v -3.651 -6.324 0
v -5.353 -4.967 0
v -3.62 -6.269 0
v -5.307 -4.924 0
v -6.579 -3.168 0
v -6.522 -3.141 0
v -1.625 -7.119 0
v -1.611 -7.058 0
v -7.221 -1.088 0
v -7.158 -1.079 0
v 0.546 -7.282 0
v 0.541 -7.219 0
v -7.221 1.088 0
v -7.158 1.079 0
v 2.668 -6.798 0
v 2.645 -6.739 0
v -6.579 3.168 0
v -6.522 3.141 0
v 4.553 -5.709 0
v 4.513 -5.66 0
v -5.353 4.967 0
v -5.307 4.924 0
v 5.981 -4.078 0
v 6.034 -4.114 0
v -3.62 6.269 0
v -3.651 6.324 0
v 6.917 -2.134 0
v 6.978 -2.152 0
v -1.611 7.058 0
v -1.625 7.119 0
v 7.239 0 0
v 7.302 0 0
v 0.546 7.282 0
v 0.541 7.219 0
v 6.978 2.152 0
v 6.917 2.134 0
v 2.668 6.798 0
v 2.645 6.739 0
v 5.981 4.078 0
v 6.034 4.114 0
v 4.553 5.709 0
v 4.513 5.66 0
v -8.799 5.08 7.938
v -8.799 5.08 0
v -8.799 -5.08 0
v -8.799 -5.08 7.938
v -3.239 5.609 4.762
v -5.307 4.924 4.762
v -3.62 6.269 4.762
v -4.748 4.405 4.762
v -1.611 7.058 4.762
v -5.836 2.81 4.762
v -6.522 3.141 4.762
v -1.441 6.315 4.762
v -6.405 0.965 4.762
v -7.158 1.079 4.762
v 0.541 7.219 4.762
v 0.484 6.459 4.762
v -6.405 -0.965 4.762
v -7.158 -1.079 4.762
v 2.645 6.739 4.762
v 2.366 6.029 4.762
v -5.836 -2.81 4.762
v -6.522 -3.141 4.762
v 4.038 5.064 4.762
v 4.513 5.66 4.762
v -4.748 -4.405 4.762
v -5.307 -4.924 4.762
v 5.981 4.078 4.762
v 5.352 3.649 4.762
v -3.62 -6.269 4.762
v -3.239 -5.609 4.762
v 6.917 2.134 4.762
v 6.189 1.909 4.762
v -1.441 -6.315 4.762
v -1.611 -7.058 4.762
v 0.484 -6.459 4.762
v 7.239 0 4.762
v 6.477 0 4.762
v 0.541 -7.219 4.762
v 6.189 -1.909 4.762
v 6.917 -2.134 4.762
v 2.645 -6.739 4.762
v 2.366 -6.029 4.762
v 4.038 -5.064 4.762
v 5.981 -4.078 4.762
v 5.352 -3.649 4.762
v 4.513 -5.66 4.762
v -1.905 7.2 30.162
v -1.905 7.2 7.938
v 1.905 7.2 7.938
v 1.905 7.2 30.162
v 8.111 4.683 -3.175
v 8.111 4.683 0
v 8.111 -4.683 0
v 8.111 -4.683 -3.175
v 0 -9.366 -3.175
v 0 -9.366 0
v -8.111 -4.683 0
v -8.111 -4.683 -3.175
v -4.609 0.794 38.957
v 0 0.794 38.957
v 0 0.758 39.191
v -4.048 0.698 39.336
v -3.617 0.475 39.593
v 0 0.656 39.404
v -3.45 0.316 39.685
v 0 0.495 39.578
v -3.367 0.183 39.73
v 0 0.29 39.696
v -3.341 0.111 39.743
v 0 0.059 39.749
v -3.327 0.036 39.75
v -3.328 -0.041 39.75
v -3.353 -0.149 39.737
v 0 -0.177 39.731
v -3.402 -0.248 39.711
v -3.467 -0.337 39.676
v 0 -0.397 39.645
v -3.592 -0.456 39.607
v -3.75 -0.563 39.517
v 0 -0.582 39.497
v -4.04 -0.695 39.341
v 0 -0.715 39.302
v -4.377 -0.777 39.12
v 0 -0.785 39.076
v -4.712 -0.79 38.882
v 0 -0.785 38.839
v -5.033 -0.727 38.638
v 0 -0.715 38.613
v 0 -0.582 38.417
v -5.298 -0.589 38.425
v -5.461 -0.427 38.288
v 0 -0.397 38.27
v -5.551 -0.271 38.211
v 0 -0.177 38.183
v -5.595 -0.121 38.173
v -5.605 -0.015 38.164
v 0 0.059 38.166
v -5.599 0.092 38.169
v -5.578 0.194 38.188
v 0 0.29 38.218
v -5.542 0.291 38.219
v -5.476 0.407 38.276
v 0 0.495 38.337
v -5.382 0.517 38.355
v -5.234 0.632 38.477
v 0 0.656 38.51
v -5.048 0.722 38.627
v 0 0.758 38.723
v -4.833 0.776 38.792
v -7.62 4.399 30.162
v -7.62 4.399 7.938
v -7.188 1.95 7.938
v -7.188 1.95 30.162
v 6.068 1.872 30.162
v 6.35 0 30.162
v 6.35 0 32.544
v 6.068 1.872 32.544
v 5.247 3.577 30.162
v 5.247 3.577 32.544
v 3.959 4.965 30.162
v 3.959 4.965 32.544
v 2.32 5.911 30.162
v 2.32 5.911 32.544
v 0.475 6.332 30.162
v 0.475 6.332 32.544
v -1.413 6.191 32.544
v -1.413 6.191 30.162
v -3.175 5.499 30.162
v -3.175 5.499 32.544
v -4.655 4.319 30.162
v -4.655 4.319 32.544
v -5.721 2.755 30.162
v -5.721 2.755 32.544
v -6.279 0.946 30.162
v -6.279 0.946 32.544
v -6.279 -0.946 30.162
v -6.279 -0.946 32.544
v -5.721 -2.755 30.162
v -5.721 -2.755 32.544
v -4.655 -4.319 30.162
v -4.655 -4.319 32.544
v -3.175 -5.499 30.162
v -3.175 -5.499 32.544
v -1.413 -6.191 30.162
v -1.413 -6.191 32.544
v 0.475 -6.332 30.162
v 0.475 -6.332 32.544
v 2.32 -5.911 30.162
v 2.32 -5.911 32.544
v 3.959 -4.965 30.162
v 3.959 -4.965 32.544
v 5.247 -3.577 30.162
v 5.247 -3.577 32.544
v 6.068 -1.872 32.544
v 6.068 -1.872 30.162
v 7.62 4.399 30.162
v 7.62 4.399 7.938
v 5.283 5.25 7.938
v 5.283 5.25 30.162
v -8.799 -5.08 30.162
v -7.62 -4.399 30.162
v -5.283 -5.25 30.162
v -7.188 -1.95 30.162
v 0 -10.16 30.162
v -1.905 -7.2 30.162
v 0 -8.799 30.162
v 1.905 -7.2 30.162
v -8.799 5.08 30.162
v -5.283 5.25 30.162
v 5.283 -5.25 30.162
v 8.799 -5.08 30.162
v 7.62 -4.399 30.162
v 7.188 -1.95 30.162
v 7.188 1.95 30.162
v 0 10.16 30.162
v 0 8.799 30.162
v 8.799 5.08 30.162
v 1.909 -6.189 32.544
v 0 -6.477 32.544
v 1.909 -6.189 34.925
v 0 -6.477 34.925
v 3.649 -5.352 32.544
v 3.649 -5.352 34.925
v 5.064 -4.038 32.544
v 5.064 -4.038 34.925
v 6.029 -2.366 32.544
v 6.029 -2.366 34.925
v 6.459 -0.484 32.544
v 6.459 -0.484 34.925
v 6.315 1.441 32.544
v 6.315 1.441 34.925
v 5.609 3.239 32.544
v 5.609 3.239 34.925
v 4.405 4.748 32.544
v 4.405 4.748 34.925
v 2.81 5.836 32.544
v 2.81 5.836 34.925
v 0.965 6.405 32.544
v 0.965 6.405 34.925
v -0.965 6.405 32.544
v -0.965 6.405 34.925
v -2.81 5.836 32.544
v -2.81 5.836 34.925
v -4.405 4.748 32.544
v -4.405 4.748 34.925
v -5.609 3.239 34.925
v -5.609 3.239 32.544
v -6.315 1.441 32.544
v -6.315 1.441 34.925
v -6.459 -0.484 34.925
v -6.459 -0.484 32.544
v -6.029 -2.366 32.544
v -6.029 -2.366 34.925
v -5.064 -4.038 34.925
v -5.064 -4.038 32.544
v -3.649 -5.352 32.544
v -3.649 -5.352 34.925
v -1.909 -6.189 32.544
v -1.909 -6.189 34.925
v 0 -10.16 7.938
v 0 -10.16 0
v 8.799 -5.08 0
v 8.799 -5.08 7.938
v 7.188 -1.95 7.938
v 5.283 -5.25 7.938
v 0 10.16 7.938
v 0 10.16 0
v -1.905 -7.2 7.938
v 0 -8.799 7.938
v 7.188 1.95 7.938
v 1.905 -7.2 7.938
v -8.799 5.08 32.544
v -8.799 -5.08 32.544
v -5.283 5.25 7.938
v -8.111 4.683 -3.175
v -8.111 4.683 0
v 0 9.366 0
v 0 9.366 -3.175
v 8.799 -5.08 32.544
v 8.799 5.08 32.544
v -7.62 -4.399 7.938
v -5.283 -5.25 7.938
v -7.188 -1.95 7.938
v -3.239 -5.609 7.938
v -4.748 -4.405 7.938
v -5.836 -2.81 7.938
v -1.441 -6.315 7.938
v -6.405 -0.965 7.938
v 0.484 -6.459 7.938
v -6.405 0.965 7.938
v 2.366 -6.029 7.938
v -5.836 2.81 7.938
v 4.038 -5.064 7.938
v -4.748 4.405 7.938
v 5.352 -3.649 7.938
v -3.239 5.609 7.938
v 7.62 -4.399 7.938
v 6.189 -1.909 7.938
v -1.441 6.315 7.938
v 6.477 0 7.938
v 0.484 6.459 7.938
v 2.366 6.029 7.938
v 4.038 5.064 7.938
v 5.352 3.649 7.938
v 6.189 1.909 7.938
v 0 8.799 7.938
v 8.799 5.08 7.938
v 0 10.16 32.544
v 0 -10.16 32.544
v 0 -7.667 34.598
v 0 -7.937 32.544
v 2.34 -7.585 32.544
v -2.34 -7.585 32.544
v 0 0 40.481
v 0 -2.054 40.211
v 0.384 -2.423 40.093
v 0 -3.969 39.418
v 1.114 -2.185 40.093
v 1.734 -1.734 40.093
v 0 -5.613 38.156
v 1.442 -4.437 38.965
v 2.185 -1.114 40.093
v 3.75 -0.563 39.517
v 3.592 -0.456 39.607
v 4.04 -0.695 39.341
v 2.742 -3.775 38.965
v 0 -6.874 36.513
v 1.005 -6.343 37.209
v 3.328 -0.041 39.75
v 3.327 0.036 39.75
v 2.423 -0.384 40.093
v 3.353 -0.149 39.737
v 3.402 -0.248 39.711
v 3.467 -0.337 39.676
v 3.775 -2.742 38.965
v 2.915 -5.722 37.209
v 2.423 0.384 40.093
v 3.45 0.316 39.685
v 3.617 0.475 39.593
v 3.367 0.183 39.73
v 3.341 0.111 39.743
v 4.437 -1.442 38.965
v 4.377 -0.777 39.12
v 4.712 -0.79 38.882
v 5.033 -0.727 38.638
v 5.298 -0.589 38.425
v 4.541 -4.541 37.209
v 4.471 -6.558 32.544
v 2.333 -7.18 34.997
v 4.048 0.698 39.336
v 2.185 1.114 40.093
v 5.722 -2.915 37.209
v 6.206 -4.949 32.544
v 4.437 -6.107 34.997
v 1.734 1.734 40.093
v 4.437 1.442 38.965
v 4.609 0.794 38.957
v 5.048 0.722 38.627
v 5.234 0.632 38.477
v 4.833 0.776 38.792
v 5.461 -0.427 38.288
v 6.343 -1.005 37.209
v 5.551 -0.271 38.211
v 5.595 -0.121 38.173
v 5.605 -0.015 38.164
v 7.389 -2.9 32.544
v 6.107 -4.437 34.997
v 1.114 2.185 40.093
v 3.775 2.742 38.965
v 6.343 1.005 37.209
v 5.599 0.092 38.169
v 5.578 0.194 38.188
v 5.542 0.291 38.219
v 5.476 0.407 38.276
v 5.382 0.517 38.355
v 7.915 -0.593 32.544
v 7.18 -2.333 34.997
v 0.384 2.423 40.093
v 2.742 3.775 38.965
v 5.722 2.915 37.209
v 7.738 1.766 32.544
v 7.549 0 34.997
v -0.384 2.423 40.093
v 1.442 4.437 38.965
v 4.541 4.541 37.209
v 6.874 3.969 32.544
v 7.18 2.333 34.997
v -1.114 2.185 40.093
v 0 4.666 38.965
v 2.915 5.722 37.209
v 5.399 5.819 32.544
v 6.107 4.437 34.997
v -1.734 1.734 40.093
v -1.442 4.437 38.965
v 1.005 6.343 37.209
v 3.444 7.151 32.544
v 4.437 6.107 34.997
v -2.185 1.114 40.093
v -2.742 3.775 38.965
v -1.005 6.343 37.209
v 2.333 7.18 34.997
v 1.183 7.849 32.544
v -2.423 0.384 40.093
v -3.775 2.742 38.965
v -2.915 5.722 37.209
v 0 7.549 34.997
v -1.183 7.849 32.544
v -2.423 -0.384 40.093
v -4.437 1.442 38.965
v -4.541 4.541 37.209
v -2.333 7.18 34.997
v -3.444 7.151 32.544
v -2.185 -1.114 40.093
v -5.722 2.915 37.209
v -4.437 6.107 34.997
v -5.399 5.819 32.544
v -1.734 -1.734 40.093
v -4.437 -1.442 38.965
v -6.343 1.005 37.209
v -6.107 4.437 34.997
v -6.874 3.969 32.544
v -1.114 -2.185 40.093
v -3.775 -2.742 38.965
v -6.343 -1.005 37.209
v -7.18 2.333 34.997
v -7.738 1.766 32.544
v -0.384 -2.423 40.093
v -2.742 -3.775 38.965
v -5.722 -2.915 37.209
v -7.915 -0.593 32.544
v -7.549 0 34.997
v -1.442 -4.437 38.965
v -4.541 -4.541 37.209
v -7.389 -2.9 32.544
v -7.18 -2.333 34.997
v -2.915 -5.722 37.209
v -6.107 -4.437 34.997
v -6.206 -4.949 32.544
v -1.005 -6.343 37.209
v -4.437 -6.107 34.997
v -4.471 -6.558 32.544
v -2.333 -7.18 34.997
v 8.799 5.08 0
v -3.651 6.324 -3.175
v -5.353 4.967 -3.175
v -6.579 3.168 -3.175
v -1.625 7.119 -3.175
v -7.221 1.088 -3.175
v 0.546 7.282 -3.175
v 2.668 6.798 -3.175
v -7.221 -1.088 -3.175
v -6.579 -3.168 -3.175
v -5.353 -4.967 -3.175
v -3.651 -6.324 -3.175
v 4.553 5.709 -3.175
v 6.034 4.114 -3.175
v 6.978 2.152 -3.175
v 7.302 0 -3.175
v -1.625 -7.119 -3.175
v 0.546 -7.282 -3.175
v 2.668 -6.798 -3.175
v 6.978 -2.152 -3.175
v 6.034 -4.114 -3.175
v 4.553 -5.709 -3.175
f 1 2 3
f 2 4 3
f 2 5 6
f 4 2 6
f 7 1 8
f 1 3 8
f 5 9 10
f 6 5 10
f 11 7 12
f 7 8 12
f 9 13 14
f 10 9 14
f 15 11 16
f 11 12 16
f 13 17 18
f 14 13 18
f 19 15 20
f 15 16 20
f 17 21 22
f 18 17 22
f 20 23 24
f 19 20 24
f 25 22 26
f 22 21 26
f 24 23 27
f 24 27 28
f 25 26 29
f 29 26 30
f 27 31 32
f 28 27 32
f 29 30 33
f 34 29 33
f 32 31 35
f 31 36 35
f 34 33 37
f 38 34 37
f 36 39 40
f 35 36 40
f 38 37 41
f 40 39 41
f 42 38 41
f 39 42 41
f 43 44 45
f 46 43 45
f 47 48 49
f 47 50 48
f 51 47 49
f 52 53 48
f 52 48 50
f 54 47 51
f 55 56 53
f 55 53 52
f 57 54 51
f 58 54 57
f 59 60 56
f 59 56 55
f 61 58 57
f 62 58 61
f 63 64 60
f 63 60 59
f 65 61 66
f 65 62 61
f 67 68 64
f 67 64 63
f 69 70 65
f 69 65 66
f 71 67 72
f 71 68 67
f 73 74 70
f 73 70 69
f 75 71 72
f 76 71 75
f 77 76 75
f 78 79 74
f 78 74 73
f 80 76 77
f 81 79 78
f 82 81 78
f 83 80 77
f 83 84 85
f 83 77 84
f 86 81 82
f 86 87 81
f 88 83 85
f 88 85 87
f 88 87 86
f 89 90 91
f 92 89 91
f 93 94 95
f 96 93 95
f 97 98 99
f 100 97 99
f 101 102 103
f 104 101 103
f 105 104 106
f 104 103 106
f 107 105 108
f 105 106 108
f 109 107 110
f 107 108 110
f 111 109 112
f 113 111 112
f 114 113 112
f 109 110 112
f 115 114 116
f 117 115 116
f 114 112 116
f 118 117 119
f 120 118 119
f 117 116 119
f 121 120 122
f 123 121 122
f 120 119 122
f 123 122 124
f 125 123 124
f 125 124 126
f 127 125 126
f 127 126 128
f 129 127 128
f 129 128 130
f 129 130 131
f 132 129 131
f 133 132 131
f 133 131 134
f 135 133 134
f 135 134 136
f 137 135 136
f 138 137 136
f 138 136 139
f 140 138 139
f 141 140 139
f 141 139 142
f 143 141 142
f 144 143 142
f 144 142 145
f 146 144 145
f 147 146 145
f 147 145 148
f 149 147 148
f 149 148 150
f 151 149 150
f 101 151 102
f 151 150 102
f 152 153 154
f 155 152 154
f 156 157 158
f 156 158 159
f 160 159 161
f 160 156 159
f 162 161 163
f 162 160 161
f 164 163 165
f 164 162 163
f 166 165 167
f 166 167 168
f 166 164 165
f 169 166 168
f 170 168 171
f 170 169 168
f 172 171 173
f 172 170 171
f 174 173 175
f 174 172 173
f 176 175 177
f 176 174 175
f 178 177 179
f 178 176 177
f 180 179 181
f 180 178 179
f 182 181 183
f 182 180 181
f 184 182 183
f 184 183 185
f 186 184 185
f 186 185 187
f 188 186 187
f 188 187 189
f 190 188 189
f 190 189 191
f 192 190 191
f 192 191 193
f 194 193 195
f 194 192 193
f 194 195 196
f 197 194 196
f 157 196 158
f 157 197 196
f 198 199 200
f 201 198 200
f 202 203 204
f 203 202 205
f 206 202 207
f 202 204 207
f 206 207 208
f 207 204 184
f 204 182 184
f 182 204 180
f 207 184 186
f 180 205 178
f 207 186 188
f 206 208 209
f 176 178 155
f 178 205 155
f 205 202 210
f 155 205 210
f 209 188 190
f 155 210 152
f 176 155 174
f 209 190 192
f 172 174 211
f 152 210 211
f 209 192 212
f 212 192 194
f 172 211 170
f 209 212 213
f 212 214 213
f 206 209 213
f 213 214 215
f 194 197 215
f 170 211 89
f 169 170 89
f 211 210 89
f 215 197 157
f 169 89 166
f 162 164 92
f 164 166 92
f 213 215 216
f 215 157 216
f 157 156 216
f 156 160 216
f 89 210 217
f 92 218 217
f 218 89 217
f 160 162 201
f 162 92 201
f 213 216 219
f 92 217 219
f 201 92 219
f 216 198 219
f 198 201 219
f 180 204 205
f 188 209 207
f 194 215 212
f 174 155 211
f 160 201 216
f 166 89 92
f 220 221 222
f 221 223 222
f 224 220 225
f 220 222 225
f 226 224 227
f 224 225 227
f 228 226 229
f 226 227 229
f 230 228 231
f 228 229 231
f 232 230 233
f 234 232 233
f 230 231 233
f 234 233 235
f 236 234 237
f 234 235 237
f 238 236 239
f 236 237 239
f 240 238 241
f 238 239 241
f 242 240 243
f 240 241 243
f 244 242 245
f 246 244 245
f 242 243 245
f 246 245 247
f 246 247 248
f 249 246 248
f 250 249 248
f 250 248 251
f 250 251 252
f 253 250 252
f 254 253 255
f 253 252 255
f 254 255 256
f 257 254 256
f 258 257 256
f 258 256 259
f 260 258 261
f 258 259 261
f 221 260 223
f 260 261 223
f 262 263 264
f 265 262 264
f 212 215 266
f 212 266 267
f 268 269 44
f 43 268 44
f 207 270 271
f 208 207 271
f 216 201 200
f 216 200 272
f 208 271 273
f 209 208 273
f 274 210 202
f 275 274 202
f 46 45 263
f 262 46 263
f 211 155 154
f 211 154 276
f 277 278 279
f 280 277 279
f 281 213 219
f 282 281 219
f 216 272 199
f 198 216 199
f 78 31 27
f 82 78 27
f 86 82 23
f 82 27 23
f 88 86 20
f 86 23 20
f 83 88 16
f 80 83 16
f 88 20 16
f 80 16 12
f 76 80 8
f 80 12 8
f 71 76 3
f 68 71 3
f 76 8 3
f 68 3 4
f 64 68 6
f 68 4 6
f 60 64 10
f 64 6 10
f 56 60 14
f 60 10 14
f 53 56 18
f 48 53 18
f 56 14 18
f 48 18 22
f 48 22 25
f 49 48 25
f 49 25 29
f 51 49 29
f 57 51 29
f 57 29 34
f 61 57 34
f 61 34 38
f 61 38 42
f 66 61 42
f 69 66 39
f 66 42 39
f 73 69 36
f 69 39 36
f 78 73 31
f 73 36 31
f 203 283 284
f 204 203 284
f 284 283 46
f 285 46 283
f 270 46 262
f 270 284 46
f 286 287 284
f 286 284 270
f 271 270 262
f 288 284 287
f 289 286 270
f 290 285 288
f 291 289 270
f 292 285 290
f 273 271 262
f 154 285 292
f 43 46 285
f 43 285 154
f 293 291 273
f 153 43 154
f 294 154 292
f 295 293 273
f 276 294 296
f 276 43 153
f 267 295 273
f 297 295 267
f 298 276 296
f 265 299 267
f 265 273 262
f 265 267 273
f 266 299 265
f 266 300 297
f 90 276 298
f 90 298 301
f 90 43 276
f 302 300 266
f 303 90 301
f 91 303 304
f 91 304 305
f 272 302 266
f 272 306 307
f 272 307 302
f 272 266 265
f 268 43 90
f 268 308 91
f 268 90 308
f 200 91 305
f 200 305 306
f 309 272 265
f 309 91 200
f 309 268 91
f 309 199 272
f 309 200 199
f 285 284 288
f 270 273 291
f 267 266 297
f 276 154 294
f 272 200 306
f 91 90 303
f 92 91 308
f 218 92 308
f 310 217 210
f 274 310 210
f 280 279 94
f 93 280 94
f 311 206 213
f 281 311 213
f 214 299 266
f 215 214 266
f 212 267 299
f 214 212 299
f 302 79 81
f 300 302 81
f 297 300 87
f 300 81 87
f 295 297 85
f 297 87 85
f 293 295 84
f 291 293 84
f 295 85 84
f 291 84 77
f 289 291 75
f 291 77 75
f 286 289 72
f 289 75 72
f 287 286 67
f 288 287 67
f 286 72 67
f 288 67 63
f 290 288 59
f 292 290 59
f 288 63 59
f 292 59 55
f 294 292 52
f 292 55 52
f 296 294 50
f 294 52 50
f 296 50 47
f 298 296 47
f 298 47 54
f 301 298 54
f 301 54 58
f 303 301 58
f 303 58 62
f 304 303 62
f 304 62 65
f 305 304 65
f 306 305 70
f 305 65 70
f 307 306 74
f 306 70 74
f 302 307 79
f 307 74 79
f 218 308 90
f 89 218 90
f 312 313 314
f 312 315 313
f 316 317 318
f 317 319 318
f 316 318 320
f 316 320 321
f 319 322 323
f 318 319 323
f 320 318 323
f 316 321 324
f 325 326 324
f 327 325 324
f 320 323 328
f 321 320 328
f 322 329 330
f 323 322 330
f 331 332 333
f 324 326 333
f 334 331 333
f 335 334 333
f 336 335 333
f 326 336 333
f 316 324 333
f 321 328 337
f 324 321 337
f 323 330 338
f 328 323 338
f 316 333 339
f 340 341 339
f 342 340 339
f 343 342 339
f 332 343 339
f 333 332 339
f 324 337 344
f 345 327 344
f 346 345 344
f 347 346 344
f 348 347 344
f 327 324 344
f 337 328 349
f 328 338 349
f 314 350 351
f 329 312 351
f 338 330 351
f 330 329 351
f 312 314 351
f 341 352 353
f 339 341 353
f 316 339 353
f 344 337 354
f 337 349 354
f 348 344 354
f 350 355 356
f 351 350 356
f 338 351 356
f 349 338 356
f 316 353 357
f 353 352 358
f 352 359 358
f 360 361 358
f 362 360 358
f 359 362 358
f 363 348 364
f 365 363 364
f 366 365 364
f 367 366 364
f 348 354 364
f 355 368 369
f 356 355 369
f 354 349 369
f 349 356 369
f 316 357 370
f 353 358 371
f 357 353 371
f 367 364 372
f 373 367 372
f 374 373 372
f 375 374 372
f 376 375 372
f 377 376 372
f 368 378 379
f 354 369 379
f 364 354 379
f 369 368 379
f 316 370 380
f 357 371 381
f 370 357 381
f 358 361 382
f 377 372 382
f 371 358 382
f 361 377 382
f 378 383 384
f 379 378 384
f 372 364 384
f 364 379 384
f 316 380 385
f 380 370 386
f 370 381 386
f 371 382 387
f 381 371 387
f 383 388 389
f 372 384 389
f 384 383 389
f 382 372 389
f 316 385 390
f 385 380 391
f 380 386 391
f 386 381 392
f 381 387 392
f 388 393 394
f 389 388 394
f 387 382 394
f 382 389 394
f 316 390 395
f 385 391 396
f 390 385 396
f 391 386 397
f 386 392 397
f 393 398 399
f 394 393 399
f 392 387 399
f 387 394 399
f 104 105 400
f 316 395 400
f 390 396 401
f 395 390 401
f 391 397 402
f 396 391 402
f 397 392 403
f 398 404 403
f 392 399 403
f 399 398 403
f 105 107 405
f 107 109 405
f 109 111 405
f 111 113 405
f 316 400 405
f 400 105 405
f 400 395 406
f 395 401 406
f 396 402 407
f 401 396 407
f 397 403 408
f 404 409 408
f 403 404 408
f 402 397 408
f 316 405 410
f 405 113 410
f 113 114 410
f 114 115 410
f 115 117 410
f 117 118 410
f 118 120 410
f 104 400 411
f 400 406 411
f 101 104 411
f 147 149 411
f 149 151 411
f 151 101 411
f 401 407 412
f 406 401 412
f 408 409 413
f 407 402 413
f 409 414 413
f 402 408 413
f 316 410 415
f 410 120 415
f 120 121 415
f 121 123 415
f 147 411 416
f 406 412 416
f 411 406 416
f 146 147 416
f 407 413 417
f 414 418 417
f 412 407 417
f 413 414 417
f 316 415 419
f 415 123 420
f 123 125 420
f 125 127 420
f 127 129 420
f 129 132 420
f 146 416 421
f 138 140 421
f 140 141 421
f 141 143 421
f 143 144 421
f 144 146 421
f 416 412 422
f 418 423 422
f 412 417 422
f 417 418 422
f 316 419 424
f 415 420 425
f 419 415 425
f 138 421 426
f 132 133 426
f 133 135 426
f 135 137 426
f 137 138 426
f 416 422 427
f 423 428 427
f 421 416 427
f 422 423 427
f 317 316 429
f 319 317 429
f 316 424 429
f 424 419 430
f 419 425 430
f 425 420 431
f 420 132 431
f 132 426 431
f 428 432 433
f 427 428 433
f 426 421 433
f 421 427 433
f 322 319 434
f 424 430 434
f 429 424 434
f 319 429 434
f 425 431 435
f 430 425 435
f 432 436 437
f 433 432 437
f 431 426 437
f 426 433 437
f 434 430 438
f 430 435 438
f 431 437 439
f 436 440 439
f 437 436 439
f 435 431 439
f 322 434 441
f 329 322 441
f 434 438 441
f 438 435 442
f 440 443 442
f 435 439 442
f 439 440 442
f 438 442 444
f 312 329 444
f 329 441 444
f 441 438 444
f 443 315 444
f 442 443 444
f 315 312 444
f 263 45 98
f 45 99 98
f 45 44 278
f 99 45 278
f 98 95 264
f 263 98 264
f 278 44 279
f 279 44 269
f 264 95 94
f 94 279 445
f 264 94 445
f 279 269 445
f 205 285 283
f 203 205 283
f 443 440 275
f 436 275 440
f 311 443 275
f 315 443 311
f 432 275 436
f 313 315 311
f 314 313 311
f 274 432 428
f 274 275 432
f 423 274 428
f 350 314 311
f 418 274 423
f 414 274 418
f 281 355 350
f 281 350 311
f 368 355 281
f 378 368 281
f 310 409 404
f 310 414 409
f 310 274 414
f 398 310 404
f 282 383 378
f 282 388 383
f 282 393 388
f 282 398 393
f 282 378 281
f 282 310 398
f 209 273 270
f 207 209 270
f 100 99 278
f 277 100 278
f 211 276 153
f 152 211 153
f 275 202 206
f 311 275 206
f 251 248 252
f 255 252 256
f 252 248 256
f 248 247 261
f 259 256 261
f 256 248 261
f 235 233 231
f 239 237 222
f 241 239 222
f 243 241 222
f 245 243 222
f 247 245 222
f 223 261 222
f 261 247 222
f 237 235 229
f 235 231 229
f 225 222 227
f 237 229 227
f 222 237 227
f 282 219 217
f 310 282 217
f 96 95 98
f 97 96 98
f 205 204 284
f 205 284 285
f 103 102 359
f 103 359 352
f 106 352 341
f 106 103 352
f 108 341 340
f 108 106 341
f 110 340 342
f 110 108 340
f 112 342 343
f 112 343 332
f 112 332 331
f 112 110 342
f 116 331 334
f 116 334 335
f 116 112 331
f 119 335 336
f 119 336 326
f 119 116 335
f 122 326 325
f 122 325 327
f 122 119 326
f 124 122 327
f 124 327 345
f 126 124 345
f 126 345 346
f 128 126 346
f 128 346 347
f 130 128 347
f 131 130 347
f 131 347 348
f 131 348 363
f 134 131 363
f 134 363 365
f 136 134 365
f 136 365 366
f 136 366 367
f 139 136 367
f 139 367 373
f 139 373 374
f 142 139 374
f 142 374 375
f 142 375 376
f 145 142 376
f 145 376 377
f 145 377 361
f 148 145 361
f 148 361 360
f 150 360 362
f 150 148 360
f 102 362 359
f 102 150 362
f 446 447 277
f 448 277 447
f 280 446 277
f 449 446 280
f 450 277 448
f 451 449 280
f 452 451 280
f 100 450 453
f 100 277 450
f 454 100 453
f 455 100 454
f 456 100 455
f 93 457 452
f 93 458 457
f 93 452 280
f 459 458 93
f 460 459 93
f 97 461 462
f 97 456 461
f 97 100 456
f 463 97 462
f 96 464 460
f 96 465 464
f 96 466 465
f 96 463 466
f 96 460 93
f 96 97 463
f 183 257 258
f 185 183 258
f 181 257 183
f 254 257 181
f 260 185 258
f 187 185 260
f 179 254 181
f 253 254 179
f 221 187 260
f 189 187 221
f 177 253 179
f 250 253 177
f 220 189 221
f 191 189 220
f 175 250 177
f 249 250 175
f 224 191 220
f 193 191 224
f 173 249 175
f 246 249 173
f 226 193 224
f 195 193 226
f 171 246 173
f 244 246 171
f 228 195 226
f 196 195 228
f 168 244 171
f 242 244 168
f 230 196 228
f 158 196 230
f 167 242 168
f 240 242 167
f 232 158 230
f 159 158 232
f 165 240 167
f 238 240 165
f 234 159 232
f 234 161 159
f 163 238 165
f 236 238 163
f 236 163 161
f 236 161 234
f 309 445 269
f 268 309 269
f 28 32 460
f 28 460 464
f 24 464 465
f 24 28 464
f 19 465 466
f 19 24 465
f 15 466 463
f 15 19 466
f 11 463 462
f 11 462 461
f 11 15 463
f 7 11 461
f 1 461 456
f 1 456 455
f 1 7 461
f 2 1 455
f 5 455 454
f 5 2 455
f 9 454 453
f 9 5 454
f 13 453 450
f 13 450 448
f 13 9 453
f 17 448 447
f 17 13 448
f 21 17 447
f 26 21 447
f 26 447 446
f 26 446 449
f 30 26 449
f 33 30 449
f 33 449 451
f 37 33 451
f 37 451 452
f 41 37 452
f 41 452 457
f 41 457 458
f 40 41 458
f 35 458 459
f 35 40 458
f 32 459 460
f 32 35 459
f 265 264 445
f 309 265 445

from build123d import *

# Parameters (mm, degrees)
F1_DEPTH       = 7.9375
F3_DEPTH       = 22.225
F4_R           = 6.35
F5_DEPTH       = 2.38125
F8_R           = 7.239
F9_DEPTH       = 4.7625
F10_R          = 6.477
F11_DEPTH      = 3.175
F12_R          = 7.3025
F13_DEPTH      = 3.175
F14_R          = 0.79375
F15_DEPTH      = 8.7998181024
F15_DEPTH_BACK = 8.7998181024


with BuildPart() as f1:
    # F0 (on Top) → F1 (new body)
    with BuildSketch(Plane.XY):
        Polygon((8.7988181024, 5.08), (0, 10.16), (-8.7988181024, 5.08), (-8.7988181024, -5.08), (0, -10.16), (8.7988181024, -5.08), align=None)
    extrude(amount=F1_DEPTH)

    # F2 (on face) → F3 (join)
    with BuildSketch(Plane.XY.offset(7.9375)):
        Polygon((1.905, 7.2003333051), (0, 8.7988181024), (-1.905, 7.2003333051), align=None)
        Polygon((-5.2831715579, 5.2499450467), (-7.62, 4.3994090512), (-7.1881715579, 1.9503882583), align=None)
        Polygon((-7.1881715579, -1.9503882583), (-7.62, -4.3994090512), (-5.2831715579, -5.2499450467), align=None)
        Polygon((-1.905, -7.2003333051), (0, -8.7988181024), (1.905, -7.2003333051), align=None)
        Polygon((5.2831715579, -5.2499450467), (7.62, -4.3994090512), (7.1881715579, -1.9503882583), align=None)
        Polygon((7.1881715579, 1.9503882583), (7.62, 4.3994090512), (5.2831715579, 5.2499450467), align=None)
    extrude(amount=F3_DEPTH)

    # F4 (on face) → F5 (join)
    with BuildSketch(Plane.XY.offset(30.1625)):
        Polygon((8.7988181024, 5.08), (0, 10.16), (-8.7988181024, 5.08), (-8.7988181024, -5.08), (0, -10.16), (8.7988181024, -5.08), align=None)
        Circle(F4_R, mode=Mode.SUBTRACT)
    extrude(amount=F5_DEPTH)

    # F6 (on Right) → F7 (revolve)
    with BuildSketch(Plane.YZ):
        with BuildLine():
            Line((-6.477, 34.925), (0, 34.925))
            Line((0, 34.925), (0, 40.48125))
            ThreePointArc((0, 40.48125), (-5.6126600757, 38.1564100757), (-7.9375, 32.54375))
            Line((-7.9375, 32.54375), (-6.477, 32.54375))
            Line((-6.477, 32.54375), (-6.477, 34.925))
        make_face()
    revolve(axis=Axis((0, 0, 32.54375), (0, 0, 1)))

    # F8 (on face) → F9 (cut)
    with BuildSketch(Plane(origin=(0, 0, 0), x_dir=(1, 0, 0), z_dir=(0, 0, -1))):
        Circle(F8_R)
    extrude(amount=-F9_DEPTH, mode=Mode.SUBTRACT)

    # F10 (on face) → F11 (cut, through all)
    with BuildSketch(Plane(origin=(0, 0, 4.7625), x_dir=(1, 0, 0), z_dir=(0, 0, -1))):
        Circle(F10_R)
    extrude(amount=-F11_DEPTH, mode=Mode.SUBTRACT)

    # F12 (on face) → F13 (join)
    with BuildSketch(Plane(origin=(0, 0, 0), x_dir=(1, 0, 0), z_dir=(0, 0, -1))):
        Polygon((-8.1114104382, -4.683125), (0, -9.36625), (8.1114104382, -4.683125), (8.1114104382, 4.683125), (0, 9.36625), (-8.1114104382, 4.683125), align=None)
        Circle(F12_R, mode=Mode.SUBTRACT)
    extrude(amount=F13_DEPTH)

    # F14 (on Right) → F15 (cut, two sides)
    with BuildSketch(Plane.YZ) as f15_sk:
        with Locations((0, 38.95725)):
            Circle(F14_R)
    extrude(amount=-F15_DEPTH, mode=Mode.SUBTRACT)
    extrude(f15_sk.sketch, amount=F15_DEPTH_BACK, mode=Mode.SUBTRACT)


solid = f1.part
